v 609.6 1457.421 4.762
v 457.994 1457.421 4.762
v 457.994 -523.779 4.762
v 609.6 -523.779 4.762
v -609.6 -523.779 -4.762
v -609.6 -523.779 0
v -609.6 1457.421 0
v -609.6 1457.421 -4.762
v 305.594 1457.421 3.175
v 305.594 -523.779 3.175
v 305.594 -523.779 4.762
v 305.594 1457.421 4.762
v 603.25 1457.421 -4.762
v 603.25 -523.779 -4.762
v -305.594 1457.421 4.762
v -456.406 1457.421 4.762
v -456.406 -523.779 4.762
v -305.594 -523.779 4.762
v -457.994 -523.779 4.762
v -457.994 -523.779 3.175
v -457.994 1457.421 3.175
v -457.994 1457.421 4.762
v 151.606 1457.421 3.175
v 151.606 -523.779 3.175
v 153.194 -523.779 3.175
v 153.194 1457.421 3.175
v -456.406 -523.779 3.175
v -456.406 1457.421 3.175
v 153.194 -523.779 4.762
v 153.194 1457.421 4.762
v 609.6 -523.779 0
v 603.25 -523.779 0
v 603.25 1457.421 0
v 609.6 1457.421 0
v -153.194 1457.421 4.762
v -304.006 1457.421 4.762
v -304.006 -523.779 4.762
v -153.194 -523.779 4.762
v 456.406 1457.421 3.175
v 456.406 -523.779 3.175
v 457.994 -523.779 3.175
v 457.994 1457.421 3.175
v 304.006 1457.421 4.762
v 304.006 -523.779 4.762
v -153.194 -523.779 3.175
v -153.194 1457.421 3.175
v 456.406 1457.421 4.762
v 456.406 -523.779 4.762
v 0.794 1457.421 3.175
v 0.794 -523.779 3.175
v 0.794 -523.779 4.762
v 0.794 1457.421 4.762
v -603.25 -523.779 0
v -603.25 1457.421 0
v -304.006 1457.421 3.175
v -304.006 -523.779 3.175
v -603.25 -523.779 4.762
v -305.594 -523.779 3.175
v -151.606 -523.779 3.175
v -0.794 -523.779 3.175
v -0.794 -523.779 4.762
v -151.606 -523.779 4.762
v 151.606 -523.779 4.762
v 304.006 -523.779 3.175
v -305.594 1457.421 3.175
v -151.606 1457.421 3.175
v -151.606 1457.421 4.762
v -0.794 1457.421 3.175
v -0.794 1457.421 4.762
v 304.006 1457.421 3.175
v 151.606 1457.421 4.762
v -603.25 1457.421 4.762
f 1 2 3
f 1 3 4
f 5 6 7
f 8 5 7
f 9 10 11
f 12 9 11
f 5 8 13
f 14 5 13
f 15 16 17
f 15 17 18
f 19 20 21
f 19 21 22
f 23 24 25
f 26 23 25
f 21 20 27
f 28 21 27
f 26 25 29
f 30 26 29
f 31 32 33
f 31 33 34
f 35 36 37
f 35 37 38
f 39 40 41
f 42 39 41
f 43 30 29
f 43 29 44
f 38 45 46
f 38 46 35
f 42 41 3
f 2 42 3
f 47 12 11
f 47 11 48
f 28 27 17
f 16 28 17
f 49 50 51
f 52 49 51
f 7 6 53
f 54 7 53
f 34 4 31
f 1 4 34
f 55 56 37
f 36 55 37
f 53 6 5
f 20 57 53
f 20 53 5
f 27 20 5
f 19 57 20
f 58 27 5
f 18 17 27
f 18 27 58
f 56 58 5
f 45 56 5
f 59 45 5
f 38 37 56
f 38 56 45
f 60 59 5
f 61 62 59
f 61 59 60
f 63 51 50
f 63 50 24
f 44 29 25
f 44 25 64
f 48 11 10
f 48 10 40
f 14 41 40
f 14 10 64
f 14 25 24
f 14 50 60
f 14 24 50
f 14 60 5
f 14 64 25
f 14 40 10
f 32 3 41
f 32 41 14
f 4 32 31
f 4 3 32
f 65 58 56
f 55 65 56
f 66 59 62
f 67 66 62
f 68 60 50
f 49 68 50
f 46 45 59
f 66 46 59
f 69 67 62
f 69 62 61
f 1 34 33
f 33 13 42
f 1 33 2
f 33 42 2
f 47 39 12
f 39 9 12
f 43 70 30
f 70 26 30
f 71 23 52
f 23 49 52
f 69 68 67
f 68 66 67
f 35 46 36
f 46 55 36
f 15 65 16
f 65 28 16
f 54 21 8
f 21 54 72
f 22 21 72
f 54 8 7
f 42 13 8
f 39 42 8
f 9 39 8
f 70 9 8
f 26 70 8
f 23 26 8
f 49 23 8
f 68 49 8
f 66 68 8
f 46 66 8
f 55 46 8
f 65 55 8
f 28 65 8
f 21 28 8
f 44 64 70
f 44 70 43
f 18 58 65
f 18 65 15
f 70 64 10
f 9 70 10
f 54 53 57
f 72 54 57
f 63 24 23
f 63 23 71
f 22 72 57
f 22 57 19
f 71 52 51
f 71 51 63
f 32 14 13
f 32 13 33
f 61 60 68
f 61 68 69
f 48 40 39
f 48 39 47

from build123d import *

# Parameters (mm, degrees)
F0_W     = 1219.2
F0_H     = 2435.225
F1_DEPTH = 4.7625
F2_W     = 6.35
F2_H     = 4.7625
F3_DEPTH = 2435.226
F4_W     = 1.5875
F4_H     = 1.5875
F5_DEPTH = 2435.226
F6_W     = 454.025
F6_H     = 9.525
F7_DEPTH = 1219.201


with BuildPart() as f1:
    # F0 (on Top) → F1 (new body, symmetric)
    with BuildSketch(Plane.XY):
        with Locations((0, 693.83302)):
            Rectangle(F0_W, F0_H)
    extrude(amount=F1_DEPTH, both=True)

    # F2 (on face) → F3 (cut, through all)
    with BuildSketch(Plane.XZ.offset(523.77948)):
        with Locations((606.425, -2.38125)):
            Rectangle(F2_W, F2_H)
        with Locations((-606.425, 2.38125)):
            Rectangle(F2_W, F2_H)
    extrude(amount=-F3_DEPTH, mode=Mode.SUBTRACT)

    # F4 (on face) → F5 (cut, through all)
    with BuildSketch(Plane.XZ.offset(523.77948)):
        with Locations((-457.2, 3.96875)):
            Rectangle(F4_W, F4_H)
        with Locations((-304.8, 3.96875)):
            Rectangle(F4_W, F4_H)
        with Locations((-152.4, 3.96875)):
            Rectangle(F4_W, F4_H)
        with Locations((0, 3.96875)):
            Rectangle(F4_W, F4_H)
        with Locations((152.4, 3.96875)):
            Rectangle(F4_W, F4_H)
        with Locations((304.8, 3.96875)):
            Rectangle(F4_W, F4_H)
        with Locations((457.2, 3.96875)):
            Rectangle(F4_W, F4_H)
    extrude(amount=-F5_DEPTH, mode=Mode.SUBTRACT)

    # F6 (on face) → F7 (cut, through all)
    with BuildSketch(Plane(origin=(-609.6, 0, 0), x_dir=(0, -1, 0), z_dir=(-1, 0, 0))):
        with Locations((-1684.43302, 0)):
            Rectangle(F6_W, F6_H)
    extrude(amount=-F7_DEPTH, mode=Mode.SUBTRACT)


solid = f1.part
